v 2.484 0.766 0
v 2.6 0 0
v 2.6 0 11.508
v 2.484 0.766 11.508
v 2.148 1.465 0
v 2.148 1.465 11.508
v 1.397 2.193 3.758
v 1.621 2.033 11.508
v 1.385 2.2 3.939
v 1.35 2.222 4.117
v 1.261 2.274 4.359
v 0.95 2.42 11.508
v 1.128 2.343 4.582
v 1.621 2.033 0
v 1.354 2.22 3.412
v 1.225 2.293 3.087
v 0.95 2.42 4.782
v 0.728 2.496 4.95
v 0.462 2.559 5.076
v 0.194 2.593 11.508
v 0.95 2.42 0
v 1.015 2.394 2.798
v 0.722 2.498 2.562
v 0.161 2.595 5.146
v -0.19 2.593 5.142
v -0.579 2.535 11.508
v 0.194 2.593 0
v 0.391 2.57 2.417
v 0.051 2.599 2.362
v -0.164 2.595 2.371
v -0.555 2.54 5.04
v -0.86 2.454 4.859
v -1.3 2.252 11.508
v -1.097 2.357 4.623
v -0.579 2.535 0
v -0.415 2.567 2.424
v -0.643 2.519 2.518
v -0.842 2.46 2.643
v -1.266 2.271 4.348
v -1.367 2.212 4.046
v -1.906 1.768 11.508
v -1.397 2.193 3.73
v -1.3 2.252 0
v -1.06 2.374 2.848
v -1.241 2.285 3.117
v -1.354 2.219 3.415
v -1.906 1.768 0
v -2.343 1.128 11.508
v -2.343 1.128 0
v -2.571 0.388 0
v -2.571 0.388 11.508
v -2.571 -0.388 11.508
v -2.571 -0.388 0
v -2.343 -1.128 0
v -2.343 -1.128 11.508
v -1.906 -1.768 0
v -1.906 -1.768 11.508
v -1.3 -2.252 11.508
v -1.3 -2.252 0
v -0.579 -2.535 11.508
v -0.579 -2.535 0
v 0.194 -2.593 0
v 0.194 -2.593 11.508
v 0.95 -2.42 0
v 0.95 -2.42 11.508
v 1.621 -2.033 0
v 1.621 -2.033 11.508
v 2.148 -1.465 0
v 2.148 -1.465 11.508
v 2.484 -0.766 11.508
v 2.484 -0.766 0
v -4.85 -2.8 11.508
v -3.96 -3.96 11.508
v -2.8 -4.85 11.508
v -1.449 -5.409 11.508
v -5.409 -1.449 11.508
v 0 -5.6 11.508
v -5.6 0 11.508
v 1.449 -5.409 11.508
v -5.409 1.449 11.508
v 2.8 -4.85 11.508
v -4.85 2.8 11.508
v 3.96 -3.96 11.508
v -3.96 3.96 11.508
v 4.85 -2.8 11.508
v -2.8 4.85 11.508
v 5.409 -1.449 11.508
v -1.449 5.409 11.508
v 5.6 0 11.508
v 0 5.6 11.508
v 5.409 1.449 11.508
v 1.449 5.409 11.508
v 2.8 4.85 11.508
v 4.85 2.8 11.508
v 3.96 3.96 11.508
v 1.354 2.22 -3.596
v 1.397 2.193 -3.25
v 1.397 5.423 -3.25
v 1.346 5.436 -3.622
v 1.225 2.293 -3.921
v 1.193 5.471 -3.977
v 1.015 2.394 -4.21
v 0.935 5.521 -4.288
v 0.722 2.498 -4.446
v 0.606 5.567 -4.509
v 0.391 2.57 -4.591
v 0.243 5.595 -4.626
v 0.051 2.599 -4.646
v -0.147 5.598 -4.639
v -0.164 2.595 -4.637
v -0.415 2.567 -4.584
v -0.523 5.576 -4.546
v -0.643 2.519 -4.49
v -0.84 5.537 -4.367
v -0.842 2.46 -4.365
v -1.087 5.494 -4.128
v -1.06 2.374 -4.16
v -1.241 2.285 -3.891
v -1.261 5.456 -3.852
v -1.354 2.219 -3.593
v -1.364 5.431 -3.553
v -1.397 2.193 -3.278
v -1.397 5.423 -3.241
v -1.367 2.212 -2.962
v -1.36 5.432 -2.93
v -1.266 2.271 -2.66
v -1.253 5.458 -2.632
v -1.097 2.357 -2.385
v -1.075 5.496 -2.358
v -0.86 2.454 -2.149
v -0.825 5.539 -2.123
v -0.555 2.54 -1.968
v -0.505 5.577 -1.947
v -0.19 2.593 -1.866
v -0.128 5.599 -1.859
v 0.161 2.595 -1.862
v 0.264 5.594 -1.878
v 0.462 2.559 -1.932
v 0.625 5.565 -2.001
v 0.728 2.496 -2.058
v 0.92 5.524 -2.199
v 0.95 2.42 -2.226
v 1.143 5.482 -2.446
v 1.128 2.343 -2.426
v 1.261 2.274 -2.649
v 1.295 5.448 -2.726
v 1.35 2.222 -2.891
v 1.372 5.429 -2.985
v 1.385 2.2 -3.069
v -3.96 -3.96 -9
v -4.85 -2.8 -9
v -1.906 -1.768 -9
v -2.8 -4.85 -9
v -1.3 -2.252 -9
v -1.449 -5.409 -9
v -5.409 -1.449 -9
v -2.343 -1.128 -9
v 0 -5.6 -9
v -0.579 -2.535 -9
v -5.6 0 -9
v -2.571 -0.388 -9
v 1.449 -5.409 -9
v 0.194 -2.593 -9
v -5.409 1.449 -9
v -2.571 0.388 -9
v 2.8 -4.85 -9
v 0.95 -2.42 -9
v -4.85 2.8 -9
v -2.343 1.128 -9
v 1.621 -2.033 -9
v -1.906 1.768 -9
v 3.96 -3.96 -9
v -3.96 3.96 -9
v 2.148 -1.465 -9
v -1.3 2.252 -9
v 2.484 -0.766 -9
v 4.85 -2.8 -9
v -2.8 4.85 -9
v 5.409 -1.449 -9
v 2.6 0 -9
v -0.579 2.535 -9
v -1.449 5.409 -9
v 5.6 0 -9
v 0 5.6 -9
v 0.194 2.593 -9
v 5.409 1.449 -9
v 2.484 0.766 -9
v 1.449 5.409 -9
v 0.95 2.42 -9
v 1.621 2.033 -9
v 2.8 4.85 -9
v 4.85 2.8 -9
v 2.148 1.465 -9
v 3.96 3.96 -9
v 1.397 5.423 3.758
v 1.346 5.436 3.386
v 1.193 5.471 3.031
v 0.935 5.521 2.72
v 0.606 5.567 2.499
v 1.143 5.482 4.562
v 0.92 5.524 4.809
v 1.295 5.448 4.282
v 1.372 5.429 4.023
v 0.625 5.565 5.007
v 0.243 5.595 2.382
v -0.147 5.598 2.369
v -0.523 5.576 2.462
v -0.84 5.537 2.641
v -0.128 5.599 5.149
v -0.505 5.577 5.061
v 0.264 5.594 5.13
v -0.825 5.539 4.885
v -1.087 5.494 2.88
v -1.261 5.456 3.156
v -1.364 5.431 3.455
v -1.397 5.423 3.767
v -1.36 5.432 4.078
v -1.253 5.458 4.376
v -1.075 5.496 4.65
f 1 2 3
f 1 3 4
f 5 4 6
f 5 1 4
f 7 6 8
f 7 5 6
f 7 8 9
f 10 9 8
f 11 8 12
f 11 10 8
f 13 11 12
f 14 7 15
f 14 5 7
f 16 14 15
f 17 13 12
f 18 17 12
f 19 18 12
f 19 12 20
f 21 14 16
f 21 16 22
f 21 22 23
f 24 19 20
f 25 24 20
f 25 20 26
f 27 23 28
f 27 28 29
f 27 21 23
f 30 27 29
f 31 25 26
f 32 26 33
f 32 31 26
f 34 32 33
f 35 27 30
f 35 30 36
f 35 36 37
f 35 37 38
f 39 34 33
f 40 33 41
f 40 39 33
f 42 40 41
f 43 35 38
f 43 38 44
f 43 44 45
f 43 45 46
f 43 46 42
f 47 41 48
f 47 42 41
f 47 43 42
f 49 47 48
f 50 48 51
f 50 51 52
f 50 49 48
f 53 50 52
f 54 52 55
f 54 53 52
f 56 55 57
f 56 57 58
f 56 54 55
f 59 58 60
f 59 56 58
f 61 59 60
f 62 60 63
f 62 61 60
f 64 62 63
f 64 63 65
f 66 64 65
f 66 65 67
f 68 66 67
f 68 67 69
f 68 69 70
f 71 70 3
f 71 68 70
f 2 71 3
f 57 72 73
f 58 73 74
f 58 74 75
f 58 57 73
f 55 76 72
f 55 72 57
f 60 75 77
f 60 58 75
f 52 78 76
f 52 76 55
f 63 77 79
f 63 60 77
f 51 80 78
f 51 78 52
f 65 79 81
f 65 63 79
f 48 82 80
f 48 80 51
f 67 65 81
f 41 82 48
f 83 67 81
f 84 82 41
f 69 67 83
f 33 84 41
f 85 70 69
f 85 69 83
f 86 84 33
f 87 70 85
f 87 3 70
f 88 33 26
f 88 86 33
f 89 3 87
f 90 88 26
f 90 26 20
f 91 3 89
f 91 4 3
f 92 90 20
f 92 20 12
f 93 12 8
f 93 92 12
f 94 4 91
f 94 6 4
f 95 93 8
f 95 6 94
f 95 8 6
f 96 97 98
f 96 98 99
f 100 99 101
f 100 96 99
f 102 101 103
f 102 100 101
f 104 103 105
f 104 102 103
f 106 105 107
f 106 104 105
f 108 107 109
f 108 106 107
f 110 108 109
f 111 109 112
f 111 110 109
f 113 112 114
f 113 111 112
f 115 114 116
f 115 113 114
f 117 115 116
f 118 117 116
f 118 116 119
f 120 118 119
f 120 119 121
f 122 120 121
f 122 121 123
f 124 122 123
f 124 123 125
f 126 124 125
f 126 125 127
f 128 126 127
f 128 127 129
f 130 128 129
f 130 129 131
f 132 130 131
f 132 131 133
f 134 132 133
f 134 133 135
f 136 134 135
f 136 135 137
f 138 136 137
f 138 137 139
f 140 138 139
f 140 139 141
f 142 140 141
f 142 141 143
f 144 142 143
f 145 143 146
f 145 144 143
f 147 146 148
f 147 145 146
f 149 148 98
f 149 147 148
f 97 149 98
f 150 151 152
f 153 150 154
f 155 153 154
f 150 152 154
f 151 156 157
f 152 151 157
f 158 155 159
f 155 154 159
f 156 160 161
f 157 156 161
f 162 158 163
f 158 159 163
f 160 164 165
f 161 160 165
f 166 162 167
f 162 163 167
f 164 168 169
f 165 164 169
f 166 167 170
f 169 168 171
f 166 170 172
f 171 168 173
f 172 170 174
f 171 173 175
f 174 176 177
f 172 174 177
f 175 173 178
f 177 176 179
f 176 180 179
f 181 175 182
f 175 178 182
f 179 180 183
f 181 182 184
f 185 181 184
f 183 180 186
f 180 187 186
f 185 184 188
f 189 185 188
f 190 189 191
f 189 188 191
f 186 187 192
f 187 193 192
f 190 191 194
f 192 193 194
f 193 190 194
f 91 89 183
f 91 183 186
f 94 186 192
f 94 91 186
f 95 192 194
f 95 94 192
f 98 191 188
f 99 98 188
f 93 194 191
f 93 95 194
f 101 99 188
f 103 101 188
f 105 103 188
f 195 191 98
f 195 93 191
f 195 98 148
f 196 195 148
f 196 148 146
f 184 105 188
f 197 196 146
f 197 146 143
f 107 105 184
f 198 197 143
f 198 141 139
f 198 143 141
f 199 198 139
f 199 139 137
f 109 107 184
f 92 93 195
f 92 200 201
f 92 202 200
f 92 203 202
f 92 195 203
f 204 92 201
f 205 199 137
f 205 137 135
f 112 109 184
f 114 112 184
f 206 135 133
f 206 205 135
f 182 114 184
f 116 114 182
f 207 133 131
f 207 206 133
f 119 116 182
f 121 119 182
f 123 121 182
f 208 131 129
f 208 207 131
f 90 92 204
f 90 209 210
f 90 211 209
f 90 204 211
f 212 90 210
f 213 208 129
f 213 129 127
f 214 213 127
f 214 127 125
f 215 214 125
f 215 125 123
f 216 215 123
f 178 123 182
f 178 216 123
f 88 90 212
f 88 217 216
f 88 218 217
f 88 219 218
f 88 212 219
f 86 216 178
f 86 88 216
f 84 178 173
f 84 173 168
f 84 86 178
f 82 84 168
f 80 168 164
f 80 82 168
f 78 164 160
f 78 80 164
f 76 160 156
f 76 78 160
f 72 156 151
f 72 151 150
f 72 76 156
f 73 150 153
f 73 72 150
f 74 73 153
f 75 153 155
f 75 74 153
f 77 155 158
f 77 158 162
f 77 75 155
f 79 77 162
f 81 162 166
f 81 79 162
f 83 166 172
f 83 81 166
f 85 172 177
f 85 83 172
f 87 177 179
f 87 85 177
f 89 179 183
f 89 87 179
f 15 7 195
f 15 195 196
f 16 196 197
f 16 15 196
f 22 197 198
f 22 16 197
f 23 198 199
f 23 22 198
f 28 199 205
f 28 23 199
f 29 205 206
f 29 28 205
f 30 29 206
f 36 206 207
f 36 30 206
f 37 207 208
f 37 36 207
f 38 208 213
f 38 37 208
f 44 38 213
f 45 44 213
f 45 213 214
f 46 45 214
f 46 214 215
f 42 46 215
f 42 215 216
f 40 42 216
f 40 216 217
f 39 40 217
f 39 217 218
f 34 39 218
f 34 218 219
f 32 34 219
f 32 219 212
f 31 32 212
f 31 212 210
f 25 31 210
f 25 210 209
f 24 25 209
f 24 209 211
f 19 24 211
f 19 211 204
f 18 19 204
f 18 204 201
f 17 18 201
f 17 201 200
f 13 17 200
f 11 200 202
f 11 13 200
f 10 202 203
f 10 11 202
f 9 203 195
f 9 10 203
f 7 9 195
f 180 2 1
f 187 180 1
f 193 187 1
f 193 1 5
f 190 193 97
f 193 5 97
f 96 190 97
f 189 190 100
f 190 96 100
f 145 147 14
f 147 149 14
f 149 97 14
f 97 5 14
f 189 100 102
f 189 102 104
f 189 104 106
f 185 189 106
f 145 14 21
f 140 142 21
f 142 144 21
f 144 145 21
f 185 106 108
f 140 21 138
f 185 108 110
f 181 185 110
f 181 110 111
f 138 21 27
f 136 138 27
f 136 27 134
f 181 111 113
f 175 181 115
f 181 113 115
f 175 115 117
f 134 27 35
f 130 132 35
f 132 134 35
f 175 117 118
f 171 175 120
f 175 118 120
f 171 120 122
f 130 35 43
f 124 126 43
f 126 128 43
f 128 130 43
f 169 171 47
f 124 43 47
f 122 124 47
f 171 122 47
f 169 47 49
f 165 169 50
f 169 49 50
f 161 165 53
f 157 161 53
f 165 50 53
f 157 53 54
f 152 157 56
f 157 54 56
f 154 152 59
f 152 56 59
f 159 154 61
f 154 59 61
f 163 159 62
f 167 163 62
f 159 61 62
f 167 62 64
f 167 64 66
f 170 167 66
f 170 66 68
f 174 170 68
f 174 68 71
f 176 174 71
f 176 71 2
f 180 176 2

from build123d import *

# Parameters (mm, degrees)
SKETCH1_R                = 5.6
SKETCH1_R_2              = 2.6
BOSS_EXTRUDE1_DEPTH      = 11.508
BOSS_EXTRUDE1_DEPTH_BACK = 9
SKETCH3_R                = 1.397
CUT_EXTRUDE2_DEPTH       = 6.6


with BuildPart() as part:
    # Sketch1 → Boss-Extrude1 (new body, two sides)
    with BuildSketch(Plane.XY) as boss_extrude1_sk:
        Circle(SKETCH1_R)
        Circle(SKETCH1_R_2, mode=Mode.SUBTRACT)
    extrude(amount=BOSS_EXTRUDE1_DEPTH)
    extrude(boss_extrude1_sk.sketch, amount=-BOSS_EXTRUDE1_DEPTH_BACK)

    # Sketch3 → Cut-Extrude2 (cut, through all)
    with BuildSketch(Plane(origin=(0, 0, 0), x_dir=(1, 0, 0), z_dir=(0, 1, 0))):
        with Locations((0, -3.758)):
            Circle(SKETCH3_R)
        with Locations((0, 3.25)):
            Circle(SKETCH3_R)
    extrude(amount=CUT_EXTRUDE2_DEPTH, mode=Mode.SUBTRACT)


solid = part.part
